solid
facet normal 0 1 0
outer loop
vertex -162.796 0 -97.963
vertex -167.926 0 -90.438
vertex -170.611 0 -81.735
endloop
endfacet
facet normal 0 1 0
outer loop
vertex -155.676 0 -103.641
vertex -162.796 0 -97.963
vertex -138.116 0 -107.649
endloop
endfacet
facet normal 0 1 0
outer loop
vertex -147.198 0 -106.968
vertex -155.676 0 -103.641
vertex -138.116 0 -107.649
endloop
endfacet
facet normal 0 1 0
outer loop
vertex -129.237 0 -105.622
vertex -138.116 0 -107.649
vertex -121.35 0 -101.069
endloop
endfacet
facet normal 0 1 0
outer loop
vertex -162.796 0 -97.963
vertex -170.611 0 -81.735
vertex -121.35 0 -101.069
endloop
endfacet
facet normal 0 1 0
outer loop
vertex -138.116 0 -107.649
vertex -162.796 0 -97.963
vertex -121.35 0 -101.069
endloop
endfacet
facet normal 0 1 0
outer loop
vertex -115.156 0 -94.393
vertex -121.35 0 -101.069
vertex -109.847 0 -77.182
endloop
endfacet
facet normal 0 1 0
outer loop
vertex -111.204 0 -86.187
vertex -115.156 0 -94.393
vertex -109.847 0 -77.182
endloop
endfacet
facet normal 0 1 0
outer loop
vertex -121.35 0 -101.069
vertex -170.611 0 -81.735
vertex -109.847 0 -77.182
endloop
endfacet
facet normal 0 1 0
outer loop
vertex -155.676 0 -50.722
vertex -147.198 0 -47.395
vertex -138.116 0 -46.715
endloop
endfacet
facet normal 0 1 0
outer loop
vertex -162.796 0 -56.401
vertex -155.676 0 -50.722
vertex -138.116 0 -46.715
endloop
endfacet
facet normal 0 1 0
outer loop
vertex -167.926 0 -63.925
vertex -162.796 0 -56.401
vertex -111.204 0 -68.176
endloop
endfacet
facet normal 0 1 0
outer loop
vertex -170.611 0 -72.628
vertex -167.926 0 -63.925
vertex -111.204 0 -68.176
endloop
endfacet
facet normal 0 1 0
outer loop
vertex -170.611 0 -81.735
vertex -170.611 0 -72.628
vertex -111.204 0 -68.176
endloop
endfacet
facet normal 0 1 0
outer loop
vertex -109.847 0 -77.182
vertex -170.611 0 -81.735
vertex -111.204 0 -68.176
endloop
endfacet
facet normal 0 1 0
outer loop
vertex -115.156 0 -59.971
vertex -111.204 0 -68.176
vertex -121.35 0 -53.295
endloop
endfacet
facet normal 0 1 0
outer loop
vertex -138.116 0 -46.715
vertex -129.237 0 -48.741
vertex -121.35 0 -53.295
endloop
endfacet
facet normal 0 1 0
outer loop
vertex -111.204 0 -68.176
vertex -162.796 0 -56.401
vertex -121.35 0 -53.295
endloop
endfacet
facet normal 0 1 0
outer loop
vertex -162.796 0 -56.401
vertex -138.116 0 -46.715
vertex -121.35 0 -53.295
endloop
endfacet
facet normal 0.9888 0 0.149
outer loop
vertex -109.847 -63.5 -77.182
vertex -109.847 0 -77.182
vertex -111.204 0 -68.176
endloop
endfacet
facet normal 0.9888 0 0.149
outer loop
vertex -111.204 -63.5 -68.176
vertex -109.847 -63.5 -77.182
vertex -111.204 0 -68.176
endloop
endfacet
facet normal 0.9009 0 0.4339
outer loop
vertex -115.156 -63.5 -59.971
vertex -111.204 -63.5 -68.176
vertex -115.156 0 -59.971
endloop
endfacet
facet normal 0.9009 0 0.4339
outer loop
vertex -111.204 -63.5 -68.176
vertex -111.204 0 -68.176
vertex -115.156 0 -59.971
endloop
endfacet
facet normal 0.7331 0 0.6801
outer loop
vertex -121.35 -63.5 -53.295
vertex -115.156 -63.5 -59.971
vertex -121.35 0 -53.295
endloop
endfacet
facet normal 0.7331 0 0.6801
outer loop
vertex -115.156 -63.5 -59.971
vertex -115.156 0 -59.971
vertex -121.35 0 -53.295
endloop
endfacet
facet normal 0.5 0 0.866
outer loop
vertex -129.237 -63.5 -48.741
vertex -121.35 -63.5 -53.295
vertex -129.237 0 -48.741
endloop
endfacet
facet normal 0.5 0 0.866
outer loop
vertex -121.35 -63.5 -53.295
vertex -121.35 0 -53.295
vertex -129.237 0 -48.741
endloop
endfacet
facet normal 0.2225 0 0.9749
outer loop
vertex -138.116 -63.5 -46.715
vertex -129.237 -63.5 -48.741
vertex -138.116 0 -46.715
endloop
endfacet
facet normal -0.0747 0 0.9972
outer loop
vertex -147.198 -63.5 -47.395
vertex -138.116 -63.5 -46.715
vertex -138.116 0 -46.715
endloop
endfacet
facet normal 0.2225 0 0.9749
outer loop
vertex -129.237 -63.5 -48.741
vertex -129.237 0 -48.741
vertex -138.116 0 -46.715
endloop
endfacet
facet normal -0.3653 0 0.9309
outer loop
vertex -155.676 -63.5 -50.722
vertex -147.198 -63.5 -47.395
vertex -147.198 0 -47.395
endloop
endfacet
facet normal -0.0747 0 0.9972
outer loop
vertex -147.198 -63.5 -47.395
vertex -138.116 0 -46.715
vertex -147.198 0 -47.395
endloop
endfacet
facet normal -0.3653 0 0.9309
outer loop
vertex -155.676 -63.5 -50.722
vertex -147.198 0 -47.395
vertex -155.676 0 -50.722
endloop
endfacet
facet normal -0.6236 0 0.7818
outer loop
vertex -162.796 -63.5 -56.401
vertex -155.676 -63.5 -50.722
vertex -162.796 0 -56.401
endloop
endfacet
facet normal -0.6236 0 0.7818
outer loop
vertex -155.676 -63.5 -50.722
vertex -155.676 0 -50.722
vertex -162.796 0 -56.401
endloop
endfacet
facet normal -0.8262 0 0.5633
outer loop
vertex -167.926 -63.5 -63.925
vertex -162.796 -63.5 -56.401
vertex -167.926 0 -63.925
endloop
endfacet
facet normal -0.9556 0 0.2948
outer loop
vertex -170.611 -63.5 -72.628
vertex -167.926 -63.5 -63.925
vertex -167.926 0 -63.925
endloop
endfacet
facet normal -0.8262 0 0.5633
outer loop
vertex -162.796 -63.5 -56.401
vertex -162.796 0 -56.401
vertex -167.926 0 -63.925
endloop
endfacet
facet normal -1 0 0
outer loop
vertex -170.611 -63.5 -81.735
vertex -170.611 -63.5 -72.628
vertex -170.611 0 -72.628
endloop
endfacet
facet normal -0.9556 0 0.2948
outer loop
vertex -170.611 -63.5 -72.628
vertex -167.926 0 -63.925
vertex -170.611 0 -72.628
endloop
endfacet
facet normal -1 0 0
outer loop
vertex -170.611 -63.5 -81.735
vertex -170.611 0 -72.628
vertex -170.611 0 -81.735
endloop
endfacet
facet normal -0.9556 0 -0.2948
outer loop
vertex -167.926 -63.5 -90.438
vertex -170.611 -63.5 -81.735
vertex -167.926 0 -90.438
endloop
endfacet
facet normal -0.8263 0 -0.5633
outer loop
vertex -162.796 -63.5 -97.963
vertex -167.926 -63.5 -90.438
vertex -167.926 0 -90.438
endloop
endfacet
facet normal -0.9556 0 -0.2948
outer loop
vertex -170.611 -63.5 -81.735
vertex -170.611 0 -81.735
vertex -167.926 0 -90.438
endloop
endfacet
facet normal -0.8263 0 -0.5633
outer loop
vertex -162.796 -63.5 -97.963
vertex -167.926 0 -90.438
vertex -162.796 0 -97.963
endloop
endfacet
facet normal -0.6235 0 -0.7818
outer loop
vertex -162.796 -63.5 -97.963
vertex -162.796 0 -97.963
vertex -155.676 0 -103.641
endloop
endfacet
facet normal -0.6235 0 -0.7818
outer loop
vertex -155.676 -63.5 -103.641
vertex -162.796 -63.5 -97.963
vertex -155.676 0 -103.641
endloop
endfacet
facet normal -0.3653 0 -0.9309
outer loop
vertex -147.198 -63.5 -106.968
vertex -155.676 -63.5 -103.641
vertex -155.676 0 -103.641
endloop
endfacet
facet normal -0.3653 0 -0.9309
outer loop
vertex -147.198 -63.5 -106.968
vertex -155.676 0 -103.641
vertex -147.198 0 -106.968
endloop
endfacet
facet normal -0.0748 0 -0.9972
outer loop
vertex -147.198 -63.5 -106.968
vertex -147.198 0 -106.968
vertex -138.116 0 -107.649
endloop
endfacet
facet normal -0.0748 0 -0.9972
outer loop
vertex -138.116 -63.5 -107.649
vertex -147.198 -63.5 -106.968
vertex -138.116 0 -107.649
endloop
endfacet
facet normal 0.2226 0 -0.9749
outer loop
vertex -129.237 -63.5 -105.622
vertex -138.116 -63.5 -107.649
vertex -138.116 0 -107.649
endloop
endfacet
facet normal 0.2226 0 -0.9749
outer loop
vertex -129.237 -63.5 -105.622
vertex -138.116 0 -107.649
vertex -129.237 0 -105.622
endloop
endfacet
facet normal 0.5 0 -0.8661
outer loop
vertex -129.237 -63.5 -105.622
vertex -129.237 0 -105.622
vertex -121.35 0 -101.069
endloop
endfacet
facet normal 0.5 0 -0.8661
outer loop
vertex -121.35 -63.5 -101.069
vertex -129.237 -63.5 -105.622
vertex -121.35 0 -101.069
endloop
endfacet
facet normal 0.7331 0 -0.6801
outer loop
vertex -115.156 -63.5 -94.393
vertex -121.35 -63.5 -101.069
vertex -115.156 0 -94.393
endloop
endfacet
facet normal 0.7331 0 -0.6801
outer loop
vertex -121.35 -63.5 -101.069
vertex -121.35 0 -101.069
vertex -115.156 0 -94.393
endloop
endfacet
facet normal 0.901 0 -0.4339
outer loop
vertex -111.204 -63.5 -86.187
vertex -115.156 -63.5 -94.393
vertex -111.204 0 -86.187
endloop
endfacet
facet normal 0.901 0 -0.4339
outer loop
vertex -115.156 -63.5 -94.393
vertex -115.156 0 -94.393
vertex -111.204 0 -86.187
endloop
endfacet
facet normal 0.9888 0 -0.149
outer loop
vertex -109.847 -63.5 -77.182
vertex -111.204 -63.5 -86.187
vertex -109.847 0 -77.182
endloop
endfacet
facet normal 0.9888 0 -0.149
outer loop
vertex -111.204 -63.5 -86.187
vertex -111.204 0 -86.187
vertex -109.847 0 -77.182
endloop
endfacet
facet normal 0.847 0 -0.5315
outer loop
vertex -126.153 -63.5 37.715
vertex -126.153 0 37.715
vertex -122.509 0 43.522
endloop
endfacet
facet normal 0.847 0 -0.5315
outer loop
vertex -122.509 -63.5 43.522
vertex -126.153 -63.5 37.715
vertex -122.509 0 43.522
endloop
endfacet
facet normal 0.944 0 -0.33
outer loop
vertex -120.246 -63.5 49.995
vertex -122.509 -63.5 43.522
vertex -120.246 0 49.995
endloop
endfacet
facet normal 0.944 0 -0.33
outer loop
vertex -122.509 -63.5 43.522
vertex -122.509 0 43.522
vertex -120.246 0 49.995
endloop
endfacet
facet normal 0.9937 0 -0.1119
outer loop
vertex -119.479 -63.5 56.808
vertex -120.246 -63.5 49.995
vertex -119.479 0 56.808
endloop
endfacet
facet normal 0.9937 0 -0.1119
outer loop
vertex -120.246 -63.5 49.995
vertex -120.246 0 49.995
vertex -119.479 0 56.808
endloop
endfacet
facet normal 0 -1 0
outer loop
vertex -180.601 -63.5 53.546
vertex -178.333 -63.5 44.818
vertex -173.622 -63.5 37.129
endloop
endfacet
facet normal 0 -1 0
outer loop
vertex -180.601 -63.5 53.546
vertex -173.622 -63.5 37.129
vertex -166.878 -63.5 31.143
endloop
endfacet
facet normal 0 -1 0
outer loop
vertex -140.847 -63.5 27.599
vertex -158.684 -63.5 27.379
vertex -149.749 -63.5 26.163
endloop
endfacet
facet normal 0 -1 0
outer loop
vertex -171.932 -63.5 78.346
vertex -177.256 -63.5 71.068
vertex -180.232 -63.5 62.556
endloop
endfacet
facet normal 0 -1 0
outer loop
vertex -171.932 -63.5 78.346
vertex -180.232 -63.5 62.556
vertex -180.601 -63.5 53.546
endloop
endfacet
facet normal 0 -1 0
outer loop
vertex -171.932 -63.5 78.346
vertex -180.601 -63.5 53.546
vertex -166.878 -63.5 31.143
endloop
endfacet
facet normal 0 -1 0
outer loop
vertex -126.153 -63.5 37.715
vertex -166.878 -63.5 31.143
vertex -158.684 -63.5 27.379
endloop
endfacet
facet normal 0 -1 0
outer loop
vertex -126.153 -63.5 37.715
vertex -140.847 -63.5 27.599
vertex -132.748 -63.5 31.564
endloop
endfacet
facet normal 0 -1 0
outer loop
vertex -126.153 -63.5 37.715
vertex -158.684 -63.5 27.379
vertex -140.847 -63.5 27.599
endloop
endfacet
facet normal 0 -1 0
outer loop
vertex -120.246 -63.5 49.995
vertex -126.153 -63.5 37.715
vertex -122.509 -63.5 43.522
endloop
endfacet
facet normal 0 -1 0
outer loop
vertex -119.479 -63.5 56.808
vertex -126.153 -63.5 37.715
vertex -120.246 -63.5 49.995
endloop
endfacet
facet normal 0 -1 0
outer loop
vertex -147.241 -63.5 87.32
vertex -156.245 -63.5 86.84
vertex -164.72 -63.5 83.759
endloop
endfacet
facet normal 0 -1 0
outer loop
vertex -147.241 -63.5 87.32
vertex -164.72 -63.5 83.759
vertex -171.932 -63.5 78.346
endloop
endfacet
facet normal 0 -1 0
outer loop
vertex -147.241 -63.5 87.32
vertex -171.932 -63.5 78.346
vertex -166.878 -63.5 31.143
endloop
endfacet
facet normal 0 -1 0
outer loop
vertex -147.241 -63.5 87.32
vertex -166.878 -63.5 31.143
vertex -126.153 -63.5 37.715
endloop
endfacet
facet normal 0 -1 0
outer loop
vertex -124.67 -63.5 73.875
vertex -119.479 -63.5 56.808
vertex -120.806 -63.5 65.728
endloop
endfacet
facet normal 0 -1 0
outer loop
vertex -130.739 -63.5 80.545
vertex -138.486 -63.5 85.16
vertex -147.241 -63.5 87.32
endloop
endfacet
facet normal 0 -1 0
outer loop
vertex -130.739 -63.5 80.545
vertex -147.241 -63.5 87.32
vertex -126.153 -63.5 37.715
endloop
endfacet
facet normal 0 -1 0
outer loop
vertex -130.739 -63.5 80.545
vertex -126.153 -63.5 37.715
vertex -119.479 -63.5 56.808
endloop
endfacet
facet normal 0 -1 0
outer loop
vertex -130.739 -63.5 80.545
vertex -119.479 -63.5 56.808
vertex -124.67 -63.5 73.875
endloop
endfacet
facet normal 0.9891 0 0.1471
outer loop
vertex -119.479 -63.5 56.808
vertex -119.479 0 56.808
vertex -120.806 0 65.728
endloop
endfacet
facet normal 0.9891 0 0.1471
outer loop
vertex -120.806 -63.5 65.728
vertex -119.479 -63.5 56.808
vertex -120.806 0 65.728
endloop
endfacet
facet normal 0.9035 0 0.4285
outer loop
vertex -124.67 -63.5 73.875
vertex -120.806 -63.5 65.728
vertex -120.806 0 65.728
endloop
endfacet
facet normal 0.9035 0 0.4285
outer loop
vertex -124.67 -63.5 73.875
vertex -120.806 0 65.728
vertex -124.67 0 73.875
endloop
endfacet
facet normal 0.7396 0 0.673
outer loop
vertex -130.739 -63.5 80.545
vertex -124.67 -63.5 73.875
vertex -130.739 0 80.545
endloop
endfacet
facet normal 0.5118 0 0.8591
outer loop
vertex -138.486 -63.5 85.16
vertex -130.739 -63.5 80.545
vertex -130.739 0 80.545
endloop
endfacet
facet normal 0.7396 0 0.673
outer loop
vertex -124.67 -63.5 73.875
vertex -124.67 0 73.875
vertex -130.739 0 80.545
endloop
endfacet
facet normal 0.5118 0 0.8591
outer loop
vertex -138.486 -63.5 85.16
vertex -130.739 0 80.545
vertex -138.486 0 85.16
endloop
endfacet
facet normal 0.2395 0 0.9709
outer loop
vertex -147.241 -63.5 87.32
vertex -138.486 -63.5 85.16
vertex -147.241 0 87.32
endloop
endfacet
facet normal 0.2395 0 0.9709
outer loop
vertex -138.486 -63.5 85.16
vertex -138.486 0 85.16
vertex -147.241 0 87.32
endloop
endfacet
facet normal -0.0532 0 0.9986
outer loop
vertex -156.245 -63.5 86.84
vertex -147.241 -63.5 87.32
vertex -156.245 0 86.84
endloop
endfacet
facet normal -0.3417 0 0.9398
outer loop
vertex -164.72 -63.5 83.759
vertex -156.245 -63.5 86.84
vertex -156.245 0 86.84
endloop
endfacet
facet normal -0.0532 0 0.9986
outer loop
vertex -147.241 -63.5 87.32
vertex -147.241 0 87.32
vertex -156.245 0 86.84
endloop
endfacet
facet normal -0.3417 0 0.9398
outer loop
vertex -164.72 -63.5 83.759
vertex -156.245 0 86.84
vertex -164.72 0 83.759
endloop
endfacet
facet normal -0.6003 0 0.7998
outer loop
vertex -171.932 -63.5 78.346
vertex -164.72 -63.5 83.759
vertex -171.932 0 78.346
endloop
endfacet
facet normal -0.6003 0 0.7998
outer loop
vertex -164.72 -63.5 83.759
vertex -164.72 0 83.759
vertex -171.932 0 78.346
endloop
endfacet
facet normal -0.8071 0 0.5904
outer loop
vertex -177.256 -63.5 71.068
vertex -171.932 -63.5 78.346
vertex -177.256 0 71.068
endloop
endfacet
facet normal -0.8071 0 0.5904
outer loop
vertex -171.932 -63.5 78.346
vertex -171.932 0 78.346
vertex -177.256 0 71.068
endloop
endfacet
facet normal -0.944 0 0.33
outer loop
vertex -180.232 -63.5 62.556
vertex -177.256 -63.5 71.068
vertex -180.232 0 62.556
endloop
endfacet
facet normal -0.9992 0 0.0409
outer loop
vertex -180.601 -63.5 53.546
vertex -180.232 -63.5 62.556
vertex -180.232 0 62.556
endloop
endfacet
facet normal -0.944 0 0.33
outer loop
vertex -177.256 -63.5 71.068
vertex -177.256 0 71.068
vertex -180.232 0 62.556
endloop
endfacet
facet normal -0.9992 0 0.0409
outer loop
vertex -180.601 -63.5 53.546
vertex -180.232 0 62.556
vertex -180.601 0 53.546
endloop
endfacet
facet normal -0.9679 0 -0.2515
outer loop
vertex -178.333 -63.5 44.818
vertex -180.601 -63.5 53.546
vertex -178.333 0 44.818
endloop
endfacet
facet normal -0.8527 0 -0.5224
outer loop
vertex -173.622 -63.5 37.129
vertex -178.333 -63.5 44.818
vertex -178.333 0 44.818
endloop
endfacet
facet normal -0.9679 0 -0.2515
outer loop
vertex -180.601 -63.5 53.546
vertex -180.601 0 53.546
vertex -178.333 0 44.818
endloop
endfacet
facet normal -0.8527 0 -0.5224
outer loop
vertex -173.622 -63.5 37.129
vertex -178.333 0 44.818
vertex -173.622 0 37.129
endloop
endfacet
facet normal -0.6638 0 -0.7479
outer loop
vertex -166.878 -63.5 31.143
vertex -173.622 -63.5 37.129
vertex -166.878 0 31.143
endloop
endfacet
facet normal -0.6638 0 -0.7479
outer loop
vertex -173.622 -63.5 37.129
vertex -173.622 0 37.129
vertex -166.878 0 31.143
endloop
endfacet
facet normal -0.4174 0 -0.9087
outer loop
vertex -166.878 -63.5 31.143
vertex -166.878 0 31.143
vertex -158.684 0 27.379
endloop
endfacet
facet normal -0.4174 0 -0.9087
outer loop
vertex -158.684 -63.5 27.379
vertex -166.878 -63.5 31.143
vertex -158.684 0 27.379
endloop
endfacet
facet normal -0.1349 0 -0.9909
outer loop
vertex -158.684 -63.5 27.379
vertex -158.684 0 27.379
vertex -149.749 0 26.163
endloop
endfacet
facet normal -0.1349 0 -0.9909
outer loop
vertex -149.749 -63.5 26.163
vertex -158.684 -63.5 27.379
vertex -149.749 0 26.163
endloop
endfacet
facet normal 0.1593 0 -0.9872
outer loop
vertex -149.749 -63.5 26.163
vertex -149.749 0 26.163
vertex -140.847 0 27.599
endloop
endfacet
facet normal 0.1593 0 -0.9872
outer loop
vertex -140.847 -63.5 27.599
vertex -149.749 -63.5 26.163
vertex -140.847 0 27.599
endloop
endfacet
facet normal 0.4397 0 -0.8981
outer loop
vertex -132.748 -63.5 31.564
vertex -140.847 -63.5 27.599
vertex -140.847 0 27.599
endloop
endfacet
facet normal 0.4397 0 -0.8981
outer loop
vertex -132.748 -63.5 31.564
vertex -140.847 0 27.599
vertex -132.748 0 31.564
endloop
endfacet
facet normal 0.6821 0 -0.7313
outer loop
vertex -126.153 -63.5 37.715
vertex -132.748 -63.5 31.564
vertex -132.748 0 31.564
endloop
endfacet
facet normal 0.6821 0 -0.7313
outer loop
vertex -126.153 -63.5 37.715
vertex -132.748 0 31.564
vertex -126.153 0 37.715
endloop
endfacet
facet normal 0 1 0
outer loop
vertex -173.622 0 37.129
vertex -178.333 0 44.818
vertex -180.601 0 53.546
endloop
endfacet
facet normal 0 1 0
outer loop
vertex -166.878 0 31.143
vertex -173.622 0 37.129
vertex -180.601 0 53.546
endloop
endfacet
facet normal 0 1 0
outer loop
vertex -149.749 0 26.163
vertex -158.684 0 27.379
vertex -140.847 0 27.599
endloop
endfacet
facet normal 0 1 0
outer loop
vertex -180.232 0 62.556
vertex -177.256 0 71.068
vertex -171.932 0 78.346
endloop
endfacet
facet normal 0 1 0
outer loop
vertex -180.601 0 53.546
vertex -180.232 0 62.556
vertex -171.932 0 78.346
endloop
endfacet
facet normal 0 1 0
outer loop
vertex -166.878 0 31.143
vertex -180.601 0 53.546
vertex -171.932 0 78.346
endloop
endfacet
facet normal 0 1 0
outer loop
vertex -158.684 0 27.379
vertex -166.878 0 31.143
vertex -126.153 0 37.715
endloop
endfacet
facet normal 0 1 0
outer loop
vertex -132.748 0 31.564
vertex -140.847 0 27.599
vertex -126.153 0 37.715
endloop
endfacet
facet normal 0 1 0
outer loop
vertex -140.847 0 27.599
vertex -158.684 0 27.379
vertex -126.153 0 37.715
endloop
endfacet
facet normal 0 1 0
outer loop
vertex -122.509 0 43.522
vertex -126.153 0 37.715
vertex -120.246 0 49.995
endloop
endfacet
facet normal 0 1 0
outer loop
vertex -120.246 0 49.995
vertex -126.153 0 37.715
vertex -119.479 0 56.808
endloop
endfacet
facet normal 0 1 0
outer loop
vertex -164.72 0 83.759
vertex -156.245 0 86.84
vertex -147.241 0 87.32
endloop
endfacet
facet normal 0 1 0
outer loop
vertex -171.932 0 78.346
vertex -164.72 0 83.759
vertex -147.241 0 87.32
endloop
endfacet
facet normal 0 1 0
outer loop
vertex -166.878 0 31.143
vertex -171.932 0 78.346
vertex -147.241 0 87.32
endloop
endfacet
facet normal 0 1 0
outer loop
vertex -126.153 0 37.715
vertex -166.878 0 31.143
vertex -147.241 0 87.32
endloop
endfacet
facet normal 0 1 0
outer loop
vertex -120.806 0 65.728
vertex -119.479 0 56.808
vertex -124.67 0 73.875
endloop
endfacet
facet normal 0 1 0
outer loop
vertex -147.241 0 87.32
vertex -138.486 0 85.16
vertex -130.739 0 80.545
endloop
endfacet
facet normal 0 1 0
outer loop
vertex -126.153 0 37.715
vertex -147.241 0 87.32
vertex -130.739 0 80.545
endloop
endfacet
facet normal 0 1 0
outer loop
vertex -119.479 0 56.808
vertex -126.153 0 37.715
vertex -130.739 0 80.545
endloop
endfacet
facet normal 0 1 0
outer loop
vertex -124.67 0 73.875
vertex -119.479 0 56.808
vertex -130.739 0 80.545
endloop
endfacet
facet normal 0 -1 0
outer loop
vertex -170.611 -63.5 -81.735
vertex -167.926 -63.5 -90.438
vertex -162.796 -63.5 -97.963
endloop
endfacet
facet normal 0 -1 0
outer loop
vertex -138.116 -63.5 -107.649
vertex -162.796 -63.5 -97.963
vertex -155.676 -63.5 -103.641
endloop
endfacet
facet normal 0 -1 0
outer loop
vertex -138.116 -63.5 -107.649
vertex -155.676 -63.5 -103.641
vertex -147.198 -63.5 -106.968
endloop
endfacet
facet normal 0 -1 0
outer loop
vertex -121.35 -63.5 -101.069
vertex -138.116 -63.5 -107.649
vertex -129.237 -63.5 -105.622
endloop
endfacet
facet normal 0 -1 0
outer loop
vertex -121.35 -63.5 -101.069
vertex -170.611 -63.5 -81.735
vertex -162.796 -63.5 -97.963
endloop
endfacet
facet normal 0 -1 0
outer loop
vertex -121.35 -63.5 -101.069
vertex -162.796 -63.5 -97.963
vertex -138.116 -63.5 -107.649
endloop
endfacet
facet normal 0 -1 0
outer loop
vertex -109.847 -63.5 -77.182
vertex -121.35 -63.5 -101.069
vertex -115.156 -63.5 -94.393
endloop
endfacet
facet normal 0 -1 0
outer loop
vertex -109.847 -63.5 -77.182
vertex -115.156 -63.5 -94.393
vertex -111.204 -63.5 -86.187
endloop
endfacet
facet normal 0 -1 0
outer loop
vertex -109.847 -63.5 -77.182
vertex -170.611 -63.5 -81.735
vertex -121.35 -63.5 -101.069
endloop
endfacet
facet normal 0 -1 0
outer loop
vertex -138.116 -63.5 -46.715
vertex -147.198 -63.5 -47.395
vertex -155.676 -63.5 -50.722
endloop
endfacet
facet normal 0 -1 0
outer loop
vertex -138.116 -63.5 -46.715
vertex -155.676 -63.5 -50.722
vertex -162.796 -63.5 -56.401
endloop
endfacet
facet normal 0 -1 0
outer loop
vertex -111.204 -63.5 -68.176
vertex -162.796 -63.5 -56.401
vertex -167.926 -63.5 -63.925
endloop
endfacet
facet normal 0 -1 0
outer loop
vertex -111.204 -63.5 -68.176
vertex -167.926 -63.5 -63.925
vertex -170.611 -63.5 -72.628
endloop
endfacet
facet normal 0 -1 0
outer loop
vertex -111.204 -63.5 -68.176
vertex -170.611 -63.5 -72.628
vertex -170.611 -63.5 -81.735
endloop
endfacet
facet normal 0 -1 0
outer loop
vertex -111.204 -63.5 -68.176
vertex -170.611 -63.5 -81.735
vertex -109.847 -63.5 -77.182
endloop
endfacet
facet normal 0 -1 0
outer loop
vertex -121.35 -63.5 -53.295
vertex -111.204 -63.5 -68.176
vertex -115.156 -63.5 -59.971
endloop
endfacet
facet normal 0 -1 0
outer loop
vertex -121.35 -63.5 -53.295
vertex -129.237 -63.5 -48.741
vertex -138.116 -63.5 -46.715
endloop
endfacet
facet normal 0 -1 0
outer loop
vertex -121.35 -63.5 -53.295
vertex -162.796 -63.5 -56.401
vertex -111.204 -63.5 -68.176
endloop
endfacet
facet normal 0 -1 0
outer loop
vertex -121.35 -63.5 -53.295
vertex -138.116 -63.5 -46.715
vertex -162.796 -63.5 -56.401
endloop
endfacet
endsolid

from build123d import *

# Parameters (mm, degrees)
F1_R     = 30.552522
F2_DEPTH = 63.5


with BuildPart() as f2:
    # F0 (on Front) + F1 (on Front) → F2 (new body)
    with BuildSketch(Plane.XZ):
        with BuildLine():
            ThreePointArc((-126.153449, 37.714677), (-121.195707, 46.695053), (-119.479023, 56.808379))
            ThreePointArc((-119.479023, 56.808379), (-179.058608, 66.921704), (-126.153449, 37.714677))
        make_face()
    with BuildSketch(Plane.XZ):
        with Locations((-140.399292, -77.181675)):
            Circle(F1_R)
    extrude(amount=F2_DEPTH)


solid = f2.part
